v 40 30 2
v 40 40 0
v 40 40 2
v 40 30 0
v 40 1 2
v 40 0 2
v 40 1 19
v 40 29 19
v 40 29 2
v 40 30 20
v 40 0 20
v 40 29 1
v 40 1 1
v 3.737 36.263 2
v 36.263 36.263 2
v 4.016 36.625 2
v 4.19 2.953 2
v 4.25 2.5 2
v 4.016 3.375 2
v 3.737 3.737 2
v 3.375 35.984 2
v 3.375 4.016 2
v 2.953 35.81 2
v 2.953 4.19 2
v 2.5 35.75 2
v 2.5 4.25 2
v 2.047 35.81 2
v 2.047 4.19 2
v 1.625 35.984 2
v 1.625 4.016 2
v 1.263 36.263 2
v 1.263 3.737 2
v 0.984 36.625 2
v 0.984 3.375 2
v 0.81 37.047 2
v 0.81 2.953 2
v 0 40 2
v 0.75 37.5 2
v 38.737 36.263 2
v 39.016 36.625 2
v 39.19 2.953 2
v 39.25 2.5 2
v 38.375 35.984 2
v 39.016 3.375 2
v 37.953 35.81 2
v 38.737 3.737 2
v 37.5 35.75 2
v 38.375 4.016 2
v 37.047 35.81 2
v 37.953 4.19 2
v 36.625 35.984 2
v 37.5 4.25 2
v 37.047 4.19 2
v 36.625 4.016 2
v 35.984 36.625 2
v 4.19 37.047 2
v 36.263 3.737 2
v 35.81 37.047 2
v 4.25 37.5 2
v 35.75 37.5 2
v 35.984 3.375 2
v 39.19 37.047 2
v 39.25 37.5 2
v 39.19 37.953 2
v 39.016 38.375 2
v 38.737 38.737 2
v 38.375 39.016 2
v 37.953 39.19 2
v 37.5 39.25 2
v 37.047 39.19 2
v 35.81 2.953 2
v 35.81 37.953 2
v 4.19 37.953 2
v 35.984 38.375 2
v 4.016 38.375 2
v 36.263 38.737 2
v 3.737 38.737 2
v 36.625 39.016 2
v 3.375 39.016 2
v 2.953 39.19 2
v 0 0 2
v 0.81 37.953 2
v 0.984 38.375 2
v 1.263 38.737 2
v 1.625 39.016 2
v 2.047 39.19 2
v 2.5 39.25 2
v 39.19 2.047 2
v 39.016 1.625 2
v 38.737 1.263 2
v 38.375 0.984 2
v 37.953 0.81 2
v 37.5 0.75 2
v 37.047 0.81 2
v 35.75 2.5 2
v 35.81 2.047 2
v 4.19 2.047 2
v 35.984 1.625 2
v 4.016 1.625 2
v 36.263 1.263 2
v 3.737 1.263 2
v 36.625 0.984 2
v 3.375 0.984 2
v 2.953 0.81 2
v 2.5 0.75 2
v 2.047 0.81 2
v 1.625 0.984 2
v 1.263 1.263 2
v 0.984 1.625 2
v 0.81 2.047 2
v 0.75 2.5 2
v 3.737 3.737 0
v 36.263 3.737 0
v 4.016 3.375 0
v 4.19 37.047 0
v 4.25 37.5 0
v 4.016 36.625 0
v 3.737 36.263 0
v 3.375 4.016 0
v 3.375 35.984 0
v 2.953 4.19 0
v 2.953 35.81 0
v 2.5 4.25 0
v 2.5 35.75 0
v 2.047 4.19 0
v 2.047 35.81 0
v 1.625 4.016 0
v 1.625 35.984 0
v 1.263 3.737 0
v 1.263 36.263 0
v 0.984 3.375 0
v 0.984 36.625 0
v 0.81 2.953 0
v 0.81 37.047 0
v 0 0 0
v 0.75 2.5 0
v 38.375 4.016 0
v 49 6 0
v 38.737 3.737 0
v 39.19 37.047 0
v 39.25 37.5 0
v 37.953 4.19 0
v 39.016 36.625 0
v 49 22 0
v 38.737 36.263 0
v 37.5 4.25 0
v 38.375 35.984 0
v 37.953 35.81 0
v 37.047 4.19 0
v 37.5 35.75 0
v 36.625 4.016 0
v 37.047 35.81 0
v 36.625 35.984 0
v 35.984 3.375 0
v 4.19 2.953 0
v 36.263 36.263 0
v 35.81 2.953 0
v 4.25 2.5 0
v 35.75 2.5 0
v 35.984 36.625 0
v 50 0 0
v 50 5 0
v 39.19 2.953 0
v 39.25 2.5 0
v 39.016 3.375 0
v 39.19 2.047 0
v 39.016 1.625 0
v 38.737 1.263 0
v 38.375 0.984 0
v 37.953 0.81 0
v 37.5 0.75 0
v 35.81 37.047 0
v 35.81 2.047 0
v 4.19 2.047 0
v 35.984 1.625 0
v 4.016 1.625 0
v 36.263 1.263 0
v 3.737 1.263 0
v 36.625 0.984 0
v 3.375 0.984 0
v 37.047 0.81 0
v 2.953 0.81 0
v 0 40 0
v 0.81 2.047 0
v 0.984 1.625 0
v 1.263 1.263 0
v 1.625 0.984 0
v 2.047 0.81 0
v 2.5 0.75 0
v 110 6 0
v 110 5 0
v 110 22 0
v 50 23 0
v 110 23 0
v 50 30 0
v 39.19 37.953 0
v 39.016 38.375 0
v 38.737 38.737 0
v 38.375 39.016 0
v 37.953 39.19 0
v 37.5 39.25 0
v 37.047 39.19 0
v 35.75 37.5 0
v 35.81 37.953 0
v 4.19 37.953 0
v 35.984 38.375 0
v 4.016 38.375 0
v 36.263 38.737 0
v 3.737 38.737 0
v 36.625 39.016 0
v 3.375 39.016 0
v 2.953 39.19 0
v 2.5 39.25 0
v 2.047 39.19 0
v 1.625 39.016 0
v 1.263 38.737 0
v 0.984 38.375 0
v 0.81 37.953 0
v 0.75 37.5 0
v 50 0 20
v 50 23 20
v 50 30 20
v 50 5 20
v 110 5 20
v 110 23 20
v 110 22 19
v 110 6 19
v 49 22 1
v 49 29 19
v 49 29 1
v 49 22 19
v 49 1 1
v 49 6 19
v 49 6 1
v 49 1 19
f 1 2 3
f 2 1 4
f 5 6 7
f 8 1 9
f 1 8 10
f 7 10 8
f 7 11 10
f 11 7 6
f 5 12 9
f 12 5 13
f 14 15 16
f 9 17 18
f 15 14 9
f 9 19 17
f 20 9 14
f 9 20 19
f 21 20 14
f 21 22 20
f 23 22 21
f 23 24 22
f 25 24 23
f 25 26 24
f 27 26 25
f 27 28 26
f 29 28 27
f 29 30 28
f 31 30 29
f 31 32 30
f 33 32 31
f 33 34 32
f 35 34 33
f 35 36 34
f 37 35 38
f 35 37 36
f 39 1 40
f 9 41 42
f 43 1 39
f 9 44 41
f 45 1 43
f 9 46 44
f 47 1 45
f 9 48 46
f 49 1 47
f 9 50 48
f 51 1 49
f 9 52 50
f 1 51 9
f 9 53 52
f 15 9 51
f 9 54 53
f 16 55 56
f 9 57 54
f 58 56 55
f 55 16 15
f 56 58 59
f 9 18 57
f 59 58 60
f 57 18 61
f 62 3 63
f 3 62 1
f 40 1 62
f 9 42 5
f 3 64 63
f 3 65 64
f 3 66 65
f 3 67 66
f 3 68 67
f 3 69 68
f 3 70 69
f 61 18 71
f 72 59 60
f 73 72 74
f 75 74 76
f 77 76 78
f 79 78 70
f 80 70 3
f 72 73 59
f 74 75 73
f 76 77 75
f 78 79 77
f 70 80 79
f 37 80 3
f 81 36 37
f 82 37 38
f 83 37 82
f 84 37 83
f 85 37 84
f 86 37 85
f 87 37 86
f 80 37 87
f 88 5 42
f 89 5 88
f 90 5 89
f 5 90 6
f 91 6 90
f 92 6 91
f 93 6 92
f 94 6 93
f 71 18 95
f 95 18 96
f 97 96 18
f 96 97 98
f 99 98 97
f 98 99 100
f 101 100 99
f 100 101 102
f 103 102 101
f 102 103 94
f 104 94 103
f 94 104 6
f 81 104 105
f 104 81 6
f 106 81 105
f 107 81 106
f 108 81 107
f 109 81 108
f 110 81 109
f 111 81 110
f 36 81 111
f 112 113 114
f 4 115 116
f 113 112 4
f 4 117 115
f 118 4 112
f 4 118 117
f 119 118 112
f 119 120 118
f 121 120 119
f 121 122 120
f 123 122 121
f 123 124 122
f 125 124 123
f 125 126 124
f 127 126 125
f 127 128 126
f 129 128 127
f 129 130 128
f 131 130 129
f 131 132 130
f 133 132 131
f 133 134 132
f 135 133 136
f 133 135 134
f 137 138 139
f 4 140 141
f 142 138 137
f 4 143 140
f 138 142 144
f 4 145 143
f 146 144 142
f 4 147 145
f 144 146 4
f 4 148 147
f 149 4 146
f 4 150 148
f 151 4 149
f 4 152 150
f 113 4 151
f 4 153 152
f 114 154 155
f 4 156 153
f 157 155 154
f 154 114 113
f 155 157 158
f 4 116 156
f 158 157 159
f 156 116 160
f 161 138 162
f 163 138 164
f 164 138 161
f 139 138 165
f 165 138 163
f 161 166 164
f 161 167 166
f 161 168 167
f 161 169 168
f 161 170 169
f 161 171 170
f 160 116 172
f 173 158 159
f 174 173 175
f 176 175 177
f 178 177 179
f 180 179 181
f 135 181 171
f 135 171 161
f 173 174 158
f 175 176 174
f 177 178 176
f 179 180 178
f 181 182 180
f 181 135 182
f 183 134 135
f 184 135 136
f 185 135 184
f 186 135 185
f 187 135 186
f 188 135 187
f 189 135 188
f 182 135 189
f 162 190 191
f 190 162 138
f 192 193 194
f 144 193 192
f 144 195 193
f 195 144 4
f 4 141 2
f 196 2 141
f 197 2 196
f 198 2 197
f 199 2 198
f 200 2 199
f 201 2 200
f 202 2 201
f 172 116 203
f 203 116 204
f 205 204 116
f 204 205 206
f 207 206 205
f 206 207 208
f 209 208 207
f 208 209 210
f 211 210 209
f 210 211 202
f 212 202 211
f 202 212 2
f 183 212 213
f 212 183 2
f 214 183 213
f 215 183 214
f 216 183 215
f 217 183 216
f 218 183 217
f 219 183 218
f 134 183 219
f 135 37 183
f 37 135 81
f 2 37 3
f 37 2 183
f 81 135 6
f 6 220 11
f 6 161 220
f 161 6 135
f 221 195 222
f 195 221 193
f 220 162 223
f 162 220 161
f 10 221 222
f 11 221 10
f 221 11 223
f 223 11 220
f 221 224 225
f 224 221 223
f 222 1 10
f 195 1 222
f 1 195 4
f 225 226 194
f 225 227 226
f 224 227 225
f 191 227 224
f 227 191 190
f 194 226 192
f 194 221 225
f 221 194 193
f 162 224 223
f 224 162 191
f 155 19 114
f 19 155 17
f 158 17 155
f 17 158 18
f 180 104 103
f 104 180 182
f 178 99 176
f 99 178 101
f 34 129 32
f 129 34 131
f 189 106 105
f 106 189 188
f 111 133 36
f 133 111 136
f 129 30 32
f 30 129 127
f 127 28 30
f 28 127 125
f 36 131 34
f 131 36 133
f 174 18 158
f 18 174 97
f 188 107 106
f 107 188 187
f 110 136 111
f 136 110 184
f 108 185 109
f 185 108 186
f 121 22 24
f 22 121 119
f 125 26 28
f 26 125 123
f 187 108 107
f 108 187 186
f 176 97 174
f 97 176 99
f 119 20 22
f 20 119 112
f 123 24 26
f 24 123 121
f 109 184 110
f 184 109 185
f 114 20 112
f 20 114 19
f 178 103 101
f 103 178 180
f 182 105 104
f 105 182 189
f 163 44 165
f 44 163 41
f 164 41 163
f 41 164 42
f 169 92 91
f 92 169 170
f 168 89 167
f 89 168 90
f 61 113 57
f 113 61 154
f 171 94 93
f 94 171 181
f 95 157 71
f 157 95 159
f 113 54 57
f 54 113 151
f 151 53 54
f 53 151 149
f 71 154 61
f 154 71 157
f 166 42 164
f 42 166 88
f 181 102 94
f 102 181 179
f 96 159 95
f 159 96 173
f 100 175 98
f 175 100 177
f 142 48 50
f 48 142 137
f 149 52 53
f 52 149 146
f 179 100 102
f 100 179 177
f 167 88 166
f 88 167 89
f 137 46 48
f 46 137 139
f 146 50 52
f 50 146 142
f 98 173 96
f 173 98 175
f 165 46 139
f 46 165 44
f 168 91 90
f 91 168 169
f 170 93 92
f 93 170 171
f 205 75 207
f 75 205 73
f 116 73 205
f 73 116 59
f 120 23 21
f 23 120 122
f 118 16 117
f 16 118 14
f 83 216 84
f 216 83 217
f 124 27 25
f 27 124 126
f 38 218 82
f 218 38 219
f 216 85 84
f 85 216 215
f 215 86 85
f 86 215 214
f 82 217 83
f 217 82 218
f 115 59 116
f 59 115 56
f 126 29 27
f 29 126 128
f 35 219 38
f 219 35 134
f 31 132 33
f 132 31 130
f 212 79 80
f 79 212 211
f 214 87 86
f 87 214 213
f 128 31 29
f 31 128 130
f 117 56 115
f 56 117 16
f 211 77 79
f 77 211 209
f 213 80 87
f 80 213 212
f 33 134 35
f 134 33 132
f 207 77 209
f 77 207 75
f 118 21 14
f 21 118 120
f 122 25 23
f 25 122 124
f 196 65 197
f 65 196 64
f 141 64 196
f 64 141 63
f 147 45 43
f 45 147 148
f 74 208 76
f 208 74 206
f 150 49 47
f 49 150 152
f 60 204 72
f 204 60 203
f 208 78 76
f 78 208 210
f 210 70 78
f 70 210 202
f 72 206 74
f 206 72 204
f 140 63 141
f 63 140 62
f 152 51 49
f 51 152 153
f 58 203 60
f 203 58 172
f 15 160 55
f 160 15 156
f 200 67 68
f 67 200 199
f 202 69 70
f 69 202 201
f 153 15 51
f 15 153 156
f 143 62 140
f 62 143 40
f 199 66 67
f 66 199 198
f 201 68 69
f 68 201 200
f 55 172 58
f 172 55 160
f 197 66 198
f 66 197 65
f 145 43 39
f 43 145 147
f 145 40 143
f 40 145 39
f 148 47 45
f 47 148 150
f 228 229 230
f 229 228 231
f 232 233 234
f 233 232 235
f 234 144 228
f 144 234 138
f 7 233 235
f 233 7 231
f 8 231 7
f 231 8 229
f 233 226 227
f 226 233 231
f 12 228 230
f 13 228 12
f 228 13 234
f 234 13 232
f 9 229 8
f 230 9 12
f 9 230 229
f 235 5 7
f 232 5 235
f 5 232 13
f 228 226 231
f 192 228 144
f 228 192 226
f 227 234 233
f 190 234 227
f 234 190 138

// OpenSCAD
difference()
{
    union()
    {
        cube([40,40,2]);
        
        translate([40,0,0])
            cube([10,30,20]);
        
        translate([50,5,0])
            cube([60,18,20]);
    }
    union()
    {
        translate([2.5,2.5,0])
            cylinder(d=3.5,h=4,$fn=24);
        translate([40-2.5,2.5,0])
            cylinder(d=3.5,h=4,$fn=24);
        translate([2.5,40-2.5,0])
            cylinder(d=3.5,h=4,$fn=24);
        translate([40-2.5,40-2.5,0])
            cylinder(d=3.5,h=4,$fn=24);
        
        translate([40,1,1])
            cube([9,30-2,20-2]);
        
        translate([50-1,5+1,0])
            cube([70,18-2,20-1]);
    }
}
